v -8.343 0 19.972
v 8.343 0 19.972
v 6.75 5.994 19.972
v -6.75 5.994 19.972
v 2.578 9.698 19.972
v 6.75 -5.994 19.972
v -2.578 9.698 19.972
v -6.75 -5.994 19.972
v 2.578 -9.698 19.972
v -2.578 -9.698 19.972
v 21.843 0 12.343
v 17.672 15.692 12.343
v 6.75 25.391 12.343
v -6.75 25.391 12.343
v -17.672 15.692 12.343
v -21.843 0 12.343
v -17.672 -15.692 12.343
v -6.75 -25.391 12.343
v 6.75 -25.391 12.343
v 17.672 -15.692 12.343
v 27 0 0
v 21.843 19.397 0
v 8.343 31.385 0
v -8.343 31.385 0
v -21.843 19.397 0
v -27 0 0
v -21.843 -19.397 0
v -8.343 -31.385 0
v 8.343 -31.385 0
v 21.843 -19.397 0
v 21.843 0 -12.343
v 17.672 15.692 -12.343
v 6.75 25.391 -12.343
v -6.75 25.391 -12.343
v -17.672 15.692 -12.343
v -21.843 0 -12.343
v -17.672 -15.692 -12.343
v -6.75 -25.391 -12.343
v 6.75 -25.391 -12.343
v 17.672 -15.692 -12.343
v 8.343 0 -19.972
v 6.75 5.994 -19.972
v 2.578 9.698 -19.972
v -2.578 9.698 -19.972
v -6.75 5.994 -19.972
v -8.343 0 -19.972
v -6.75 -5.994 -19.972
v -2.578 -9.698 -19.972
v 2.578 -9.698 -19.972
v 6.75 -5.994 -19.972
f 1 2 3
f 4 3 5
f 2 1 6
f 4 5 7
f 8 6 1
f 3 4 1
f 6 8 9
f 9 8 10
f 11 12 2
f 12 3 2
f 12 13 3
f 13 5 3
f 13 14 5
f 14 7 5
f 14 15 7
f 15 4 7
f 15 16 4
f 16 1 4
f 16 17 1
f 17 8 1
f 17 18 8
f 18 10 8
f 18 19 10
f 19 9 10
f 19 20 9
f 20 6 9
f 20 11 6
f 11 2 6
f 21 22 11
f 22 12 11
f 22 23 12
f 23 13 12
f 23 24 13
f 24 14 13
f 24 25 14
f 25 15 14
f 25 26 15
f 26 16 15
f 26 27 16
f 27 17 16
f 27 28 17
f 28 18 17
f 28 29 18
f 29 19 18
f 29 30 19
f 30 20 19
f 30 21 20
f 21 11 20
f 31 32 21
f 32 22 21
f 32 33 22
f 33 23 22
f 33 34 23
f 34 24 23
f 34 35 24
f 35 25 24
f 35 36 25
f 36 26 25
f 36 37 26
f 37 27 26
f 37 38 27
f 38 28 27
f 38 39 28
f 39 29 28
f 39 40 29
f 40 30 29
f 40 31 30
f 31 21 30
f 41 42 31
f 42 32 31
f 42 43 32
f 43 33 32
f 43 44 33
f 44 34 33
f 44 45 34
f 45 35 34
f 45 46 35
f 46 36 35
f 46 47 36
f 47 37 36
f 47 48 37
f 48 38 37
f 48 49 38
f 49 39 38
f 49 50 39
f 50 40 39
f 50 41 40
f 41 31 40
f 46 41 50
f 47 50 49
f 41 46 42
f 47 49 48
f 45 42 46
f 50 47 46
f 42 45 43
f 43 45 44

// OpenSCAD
// Generated by SolidPython 1.0.1 on 2020-07-29 00:46:48


scale(v = [9, 11, 7]) {
	sphere(r = 3);
}
/***********************************************
*********      SolidPython code:      **********
************************************************
 
# import packages: SolidPython
from solid import *
from solid.utils import *
from itertools import chain, combinations, permutations


class Resize:

    def __init__(self, scad_file):
        self.scad_file = scad_file
        #self.scad_file = import_scad(scad_file)
        # cone/cylinder param:
        self.r1 = 0
        self.r2 = 0
        self.h = 0
        # rectangular prism param:
        self.w = 0
        self.l = 0
        # ellipse param:
        self.r = 0

    # import OpenScad code (file name corresponds to shape)


    # classify shape + parameters
    def assign(self, param1, param2, param3):
        if self.scad_file == 'cone.scad':
            self.r1 = param1
            self.r2 = param2
            self.h = param3
        elif self.scad_file == 'cylinder.scad':
            self.r1 = param1
            self.r2 = param2
            self.h = param3
        elif self.scad_file == 'rectangularPrism.scad':
            self.h = param1
            self.l = param2
            self.w = param3
        else:
            self.r = param1
            self.h = param2

    # resize parameters
    def iterate(self):
        x = range(3, 20, 2)
        i = 1
        if self.scad_file == 'cone.scad':
            tempList = list(permutations(x, 2))
            for temp in tempList:
                param1 = temp[0]
                param2 = temp[1]
                filepath = 'produced_scad_files/' + 'cone' + str(param1) + '_' + str(param2) + '_' + '.scad'
                scad_render_to_file(cylinder(h=param1, r1=param2, r2=0), filepath)

        elif self.scad_file == 'cylinder.scad':
            tempList = list(permutations(x, 3))
            for temp in tempList:
                param1 = temp[0]
                param2 = temp[1]
                filepath = 'produced_scad_files/' + 'cylinder' + str(param1) + '_' + str(param2) + '_' + '.scad'
                scad_render_to_file(cylinder(h=param1, r1=param2, r2=param2), filepath)

        elif self.scad_file == 'rectangularPrism.scad':
            tempList = list(permutations(x, 3))
            for temp in tempList:
                param1 = temp[0]
                param2 = temp[1]
                param3 = temp[2]
                filepath = 'produced_scad_files/' + 'rectangularPrism' + str(param1) + '_' + str(param2) + '_' + str(
                    param3) + '.scad'
                scad_render_to_file(cube(size=(param1, param2, param3)), filepath)

        elif self.scad_file == 'ellipse.scad':
            tempList = list(permutations(x, 4))
            for temp in tempList:
                param1 = temp[0]
                param2 = temp[1]
                param3 = temp[2]
                param4 = temp[3]
                filepath = 'produced_scad_files/' + 'ellipse' + str(param1) + '_' + str(param2) + '_' + str(param3) + '_' + str(param4) + '.scad'
                scad_render_to_file(scale([param1, param2, param3])(sphere(r=param4)), filepath)

    def render_to_scadfile(self):
        scad_render_to_file(scad, 'example.scad') 
 
************************************************/
